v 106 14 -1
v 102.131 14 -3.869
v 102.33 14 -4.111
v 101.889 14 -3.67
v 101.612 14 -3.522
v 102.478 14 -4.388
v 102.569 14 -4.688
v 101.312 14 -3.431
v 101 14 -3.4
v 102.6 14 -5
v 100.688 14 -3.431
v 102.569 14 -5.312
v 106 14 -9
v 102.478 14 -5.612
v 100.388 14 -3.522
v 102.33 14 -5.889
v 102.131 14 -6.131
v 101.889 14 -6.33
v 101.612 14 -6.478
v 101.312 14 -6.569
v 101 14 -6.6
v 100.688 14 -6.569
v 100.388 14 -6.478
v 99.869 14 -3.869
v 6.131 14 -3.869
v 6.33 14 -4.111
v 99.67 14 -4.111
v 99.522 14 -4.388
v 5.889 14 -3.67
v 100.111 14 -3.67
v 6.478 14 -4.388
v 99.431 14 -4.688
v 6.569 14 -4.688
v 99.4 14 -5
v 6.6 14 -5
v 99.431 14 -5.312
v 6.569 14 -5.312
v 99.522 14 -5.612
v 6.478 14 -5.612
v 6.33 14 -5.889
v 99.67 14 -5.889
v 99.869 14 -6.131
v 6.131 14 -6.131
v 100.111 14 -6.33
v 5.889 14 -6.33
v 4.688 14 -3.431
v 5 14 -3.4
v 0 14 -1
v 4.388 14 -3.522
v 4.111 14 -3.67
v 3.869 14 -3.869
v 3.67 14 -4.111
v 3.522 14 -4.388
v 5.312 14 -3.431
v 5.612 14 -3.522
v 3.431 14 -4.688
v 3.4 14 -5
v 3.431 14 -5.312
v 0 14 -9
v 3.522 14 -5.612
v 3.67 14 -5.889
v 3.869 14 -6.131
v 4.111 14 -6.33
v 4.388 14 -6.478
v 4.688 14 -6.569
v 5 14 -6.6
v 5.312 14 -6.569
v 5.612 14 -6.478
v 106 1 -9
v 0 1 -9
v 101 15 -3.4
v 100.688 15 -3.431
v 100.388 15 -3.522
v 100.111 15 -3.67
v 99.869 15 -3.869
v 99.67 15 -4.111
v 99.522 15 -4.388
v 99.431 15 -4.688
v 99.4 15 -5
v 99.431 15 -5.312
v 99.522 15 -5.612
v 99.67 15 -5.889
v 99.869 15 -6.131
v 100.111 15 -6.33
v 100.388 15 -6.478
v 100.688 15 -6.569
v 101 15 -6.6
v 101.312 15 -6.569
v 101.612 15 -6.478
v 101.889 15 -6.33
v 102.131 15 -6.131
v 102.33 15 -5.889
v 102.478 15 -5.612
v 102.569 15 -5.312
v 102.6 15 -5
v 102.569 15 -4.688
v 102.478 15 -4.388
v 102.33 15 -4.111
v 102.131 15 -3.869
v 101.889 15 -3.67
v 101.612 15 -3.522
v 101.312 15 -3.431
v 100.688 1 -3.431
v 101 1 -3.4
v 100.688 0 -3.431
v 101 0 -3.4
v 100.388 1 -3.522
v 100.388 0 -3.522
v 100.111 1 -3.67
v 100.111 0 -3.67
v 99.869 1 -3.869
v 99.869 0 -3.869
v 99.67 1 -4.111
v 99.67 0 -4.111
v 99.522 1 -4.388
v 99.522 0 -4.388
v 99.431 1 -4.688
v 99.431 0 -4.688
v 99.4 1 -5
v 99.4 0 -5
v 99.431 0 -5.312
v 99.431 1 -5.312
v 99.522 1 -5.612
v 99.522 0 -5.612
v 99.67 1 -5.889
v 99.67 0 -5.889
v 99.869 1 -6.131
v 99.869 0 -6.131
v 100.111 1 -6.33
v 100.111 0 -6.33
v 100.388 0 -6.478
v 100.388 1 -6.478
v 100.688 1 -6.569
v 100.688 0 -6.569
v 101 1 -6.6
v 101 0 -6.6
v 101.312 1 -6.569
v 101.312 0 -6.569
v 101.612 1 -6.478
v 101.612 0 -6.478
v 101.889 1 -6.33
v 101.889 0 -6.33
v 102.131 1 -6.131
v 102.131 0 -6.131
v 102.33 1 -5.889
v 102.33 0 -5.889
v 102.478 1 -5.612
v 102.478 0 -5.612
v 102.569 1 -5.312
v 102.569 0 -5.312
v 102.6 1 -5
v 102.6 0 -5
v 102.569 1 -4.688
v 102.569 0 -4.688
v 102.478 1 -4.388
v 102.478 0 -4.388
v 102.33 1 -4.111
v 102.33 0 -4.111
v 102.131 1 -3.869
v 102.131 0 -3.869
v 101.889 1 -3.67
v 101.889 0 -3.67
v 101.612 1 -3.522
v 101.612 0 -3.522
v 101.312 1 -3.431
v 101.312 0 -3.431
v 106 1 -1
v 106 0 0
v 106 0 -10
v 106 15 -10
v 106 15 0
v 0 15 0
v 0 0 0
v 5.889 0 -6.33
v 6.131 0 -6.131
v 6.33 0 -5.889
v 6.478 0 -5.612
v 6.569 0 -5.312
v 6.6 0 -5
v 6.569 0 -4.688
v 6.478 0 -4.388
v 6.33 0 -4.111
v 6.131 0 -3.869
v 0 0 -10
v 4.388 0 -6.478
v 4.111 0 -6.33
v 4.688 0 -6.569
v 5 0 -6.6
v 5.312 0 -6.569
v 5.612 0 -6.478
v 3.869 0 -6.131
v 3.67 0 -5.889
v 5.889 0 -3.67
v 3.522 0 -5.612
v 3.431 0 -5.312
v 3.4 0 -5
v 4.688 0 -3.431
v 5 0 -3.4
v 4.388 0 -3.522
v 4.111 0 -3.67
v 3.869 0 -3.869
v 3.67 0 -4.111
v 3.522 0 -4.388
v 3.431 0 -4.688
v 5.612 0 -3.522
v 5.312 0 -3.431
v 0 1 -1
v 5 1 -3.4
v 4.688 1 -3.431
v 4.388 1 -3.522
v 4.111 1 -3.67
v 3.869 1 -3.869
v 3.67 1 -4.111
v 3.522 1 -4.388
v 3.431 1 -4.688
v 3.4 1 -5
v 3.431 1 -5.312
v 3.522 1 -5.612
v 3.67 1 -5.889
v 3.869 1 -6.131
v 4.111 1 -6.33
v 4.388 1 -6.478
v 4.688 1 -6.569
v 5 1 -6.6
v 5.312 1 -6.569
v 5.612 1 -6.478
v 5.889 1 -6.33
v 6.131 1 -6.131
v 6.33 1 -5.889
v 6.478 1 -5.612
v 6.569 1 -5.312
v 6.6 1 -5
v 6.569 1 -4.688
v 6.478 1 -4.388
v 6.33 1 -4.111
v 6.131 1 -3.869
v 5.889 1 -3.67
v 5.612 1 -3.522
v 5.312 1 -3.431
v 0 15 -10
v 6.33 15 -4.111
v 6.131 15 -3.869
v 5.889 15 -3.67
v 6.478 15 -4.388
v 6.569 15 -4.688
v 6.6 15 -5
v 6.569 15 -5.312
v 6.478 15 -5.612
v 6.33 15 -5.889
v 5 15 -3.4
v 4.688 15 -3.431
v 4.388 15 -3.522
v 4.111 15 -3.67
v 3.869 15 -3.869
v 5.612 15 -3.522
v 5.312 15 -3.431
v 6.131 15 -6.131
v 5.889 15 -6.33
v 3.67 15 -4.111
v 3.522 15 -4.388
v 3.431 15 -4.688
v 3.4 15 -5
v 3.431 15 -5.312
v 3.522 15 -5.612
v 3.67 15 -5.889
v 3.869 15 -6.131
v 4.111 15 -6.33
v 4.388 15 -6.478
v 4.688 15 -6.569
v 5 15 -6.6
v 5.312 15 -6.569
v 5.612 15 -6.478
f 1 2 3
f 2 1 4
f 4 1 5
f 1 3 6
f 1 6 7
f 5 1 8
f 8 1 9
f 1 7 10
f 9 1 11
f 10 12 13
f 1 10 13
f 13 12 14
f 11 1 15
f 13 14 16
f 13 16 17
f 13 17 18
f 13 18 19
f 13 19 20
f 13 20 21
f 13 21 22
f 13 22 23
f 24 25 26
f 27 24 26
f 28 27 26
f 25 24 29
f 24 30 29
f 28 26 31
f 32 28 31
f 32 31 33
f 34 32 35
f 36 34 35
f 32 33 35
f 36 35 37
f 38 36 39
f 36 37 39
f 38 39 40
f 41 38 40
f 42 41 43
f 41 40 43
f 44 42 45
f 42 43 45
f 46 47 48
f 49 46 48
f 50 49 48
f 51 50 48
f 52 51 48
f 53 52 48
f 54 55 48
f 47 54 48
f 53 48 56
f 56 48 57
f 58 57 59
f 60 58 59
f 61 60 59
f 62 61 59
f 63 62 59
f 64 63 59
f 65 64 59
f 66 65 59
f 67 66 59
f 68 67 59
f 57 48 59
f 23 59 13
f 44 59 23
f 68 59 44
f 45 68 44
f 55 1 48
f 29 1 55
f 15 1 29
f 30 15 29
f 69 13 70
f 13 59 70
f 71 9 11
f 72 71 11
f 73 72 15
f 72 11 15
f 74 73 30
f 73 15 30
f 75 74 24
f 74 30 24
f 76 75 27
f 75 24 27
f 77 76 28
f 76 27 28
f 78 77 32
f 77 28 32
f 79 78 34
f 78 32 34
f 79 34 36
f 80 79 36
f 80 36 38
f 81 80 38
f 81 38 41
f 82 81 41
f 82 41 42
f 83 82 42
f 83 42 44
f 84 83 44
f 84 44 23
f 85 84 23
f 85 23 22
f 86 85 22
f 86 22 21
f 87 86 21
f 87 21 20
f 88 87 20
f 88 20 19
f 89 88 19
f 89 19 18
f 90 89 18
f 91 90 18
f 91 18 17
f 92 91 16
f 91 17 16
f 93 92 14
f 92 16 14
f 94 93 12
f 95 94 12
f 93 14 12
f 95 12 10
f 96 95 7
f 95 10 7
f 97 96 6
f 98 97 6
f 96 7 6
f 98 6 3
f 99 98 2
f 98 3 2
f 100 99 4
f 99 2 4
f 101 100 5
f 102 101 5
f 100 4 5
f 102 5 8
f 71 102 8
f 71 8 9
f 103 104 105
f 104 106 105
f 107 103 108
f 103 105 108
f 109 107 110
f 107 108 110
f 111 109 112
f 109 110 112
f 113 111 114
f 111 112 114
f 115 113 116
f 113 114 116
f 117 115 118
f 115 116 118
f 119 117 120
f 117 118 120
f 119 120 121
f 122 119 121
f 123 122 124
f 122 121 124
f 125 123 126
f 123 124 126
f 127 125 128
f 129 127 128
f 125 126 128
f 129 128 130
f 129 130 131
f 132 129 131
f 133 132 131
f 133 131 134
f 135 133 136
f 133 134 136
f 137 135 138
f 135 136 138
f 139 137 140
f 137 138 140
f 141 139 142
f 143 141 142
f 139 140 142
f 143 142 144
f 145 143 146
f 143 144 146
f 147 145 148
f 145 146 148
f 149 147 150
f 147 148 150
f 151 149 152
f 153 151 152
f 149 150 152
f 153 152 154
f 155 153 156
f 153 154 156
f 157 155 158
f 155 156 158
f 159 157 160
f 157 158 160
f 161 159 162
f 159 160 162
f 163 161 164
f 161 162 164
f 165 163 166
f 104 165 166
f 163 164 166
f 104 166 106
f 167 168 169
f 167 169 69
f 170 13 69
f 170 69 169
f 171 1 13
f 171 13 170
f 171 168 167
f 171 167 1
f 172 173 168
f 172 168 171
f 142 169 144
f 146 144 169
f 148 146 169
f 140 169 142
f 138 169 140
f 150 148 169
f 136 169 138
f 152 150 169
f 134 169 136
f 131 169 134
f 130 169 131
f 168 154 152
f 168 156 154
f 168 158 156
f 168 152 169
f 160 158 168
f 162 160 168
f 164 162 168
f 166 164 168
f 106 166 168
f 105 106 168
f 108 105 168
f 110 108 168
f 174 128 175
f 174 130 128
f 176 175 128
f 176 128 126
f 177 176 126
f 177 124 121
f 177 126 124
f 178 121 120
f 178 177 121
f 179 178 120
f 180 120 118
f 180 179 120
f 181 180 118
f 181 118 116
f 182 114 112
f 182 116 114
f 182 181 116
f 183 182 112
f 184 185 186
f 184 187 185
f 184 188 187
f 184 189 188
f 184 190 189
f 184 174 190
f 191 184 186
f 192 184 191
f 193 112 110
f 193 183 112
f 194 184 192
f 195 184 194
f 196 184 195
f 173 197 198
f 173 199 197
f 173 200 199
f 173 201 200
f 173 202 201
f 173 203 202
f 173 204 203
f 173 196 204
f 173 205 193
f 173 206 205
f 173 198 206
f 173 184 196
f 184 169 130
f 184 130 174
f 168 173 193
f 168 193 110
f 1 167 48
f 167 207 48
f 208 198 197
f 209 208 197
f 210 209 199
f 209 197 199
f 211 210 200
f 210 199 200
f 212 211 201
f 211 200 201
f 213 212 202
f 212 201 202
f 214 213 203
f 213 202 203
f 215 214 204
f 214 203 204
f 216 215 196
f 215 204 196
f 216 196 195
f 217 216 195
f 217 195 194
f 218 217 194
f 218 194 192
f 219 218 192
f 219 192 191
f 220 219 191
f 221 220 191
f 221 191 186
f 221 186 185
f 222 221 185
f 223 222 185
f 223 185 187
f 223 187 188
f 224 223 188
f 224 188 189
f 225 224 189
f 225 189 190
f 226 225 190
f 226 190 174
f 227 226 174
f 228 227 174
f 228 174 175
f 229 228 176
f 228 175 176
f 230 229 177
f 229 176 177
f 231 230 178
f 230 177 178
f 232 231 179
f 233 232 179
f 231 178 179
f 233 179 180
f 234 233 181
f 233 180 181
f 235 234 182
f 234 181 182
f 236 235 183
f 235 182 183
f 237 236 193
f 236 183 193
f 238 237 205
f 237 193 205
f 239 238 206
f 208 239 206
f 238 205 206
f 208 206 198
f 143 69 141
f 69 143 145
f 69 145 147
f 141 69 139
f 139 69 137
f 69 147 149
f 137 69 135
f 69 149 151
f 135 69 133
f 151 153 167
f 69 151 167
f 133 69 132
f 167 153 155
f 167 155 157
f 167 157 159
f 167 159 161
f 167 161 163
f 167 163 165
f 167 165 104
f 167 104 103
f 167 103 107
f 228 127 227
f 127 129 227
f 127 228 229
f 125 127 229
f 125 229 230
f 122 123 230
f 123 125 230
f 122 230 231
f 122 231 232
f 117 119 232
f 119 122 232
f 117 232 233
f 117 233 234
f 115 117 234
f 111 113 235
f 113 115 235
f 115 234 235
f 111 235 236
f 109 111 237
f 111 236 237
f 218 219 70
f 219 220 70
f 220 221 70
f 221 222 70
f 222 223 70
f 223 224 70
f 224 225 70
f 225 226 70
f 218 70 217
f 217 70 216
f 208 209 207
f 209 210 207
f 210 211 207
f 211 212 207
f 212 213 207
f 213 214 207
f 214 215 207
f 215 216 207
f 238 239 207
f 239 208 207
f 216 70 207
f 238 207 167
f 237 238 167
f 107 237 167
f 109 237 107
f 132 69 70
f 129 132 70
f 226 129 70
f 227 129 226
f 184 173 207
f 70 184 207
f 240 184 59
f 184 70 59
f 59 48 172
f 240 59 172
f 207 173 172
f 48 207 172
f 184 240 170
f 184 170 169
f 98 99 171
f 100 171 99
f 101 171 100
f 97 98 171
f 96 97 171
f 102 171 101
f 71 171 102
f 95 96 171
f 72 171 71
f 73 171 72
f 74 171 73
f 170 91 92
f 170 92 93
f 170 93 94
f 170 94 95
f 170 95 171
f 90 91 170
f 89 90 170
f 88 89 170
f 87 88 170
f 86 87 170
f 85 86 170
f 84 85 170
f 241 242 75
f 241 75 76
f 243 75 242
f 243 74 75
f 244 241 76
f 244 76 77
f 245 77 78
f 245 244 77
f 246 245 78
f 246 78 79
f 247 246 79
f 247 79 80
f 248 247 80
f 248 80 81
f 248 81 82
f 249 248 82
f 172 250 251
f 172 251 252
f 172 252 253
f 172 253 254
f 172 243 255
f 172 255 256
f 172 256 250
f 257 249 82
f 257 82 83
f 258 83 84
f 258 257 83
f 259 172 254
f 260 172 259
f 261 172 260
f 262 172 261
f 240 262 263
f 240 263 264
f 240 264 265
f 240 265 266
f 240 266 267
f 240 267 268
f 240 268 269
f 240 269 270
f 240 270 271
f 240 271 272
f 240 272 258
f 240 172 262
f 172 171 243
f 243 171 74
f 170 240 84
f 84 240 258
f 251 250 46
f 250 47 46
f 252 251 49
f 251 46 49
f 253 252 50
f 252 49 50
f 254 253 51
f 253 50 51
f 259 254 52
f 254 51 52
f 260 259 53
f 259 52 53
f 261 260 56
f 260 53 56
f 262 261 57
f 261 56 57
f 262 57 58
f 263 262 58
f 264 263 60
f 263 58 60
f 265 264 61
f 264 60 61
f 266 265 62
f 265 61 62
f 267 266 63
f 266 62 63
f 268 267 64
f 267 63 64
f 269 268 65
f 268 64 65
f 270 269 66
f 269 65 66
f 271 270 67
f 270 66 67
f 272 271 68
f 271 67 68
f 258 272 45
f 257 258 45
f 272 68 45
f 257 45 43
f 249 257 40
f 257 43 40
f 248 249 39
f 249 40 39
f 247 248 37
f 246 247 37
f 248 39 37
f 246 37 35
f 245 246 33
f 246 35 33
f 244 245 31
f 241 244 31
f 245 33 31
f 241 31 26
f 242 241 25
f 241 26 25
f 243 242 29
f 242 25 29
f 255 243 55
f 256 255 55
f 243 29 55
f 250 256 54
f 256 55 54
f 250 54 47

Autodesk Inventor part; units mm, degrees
ref_plane "YZ Plane" through (0, 0, 0) normal (1, 0, 0) x (0, 1, 0)
ref_plane "XZ Plane" through (0, 0, 0) normal (0, 1, 0) x (-1, 0, 0)
ref_plane "XY Plane" through (0, 0, 0) normal (0, 0, 1) x (1, 0, 0)
sketch "スケッチ1" plane through (0, 0, 0) normal (1, 0, 0) x (0, 1, 0)
  line L0 (0, 0) -> (15, 0)
  line L1 (15, 0) -> (15, -10)
  line L2 (15, -10) -> (0, -10)
  line L3 (0, -10) -> (0, 0)
  line L4 (1, -1) -> (14, -1)
  line L5 (14, -1) -> (14, -9)
  line L6 (14, -9) -> (1, -9)
  line L7 (1, -9) -> (1, -1)
  dimension "d0" = 15
  dimension "d1" = 10
  dimension "d2" = 13
  dimension "d3" = 8
  dimension "d4" = 1
  dimension "d5" = 1
extrude "押し出し1" add sketch "スケッチ1" along normal blind 106
sketch "スケッチ2" plane through (0, 15, 0) normal (0, 1, 0) x (1, 0, 0)
  line L0 (0, 9) -> (0, 1) projected
  line L1 (0, 5) -> (120, 5)
  line L2 (106, 10) -> (106, 0) projected
  point P0 (0, 0)
  point P1 (5, 5)
  point P2 (101, 5)
  point P3 (106, 0)
  dimension "d8" = 5
  dimension "d9" = 5
hole "穴1" at (5, 15, -5) at (101, 15, -5) direction (0, -1, 0) diameter 3.2 end through all
properties part number "link2_pipe2" material "アルミニウム 6061"
